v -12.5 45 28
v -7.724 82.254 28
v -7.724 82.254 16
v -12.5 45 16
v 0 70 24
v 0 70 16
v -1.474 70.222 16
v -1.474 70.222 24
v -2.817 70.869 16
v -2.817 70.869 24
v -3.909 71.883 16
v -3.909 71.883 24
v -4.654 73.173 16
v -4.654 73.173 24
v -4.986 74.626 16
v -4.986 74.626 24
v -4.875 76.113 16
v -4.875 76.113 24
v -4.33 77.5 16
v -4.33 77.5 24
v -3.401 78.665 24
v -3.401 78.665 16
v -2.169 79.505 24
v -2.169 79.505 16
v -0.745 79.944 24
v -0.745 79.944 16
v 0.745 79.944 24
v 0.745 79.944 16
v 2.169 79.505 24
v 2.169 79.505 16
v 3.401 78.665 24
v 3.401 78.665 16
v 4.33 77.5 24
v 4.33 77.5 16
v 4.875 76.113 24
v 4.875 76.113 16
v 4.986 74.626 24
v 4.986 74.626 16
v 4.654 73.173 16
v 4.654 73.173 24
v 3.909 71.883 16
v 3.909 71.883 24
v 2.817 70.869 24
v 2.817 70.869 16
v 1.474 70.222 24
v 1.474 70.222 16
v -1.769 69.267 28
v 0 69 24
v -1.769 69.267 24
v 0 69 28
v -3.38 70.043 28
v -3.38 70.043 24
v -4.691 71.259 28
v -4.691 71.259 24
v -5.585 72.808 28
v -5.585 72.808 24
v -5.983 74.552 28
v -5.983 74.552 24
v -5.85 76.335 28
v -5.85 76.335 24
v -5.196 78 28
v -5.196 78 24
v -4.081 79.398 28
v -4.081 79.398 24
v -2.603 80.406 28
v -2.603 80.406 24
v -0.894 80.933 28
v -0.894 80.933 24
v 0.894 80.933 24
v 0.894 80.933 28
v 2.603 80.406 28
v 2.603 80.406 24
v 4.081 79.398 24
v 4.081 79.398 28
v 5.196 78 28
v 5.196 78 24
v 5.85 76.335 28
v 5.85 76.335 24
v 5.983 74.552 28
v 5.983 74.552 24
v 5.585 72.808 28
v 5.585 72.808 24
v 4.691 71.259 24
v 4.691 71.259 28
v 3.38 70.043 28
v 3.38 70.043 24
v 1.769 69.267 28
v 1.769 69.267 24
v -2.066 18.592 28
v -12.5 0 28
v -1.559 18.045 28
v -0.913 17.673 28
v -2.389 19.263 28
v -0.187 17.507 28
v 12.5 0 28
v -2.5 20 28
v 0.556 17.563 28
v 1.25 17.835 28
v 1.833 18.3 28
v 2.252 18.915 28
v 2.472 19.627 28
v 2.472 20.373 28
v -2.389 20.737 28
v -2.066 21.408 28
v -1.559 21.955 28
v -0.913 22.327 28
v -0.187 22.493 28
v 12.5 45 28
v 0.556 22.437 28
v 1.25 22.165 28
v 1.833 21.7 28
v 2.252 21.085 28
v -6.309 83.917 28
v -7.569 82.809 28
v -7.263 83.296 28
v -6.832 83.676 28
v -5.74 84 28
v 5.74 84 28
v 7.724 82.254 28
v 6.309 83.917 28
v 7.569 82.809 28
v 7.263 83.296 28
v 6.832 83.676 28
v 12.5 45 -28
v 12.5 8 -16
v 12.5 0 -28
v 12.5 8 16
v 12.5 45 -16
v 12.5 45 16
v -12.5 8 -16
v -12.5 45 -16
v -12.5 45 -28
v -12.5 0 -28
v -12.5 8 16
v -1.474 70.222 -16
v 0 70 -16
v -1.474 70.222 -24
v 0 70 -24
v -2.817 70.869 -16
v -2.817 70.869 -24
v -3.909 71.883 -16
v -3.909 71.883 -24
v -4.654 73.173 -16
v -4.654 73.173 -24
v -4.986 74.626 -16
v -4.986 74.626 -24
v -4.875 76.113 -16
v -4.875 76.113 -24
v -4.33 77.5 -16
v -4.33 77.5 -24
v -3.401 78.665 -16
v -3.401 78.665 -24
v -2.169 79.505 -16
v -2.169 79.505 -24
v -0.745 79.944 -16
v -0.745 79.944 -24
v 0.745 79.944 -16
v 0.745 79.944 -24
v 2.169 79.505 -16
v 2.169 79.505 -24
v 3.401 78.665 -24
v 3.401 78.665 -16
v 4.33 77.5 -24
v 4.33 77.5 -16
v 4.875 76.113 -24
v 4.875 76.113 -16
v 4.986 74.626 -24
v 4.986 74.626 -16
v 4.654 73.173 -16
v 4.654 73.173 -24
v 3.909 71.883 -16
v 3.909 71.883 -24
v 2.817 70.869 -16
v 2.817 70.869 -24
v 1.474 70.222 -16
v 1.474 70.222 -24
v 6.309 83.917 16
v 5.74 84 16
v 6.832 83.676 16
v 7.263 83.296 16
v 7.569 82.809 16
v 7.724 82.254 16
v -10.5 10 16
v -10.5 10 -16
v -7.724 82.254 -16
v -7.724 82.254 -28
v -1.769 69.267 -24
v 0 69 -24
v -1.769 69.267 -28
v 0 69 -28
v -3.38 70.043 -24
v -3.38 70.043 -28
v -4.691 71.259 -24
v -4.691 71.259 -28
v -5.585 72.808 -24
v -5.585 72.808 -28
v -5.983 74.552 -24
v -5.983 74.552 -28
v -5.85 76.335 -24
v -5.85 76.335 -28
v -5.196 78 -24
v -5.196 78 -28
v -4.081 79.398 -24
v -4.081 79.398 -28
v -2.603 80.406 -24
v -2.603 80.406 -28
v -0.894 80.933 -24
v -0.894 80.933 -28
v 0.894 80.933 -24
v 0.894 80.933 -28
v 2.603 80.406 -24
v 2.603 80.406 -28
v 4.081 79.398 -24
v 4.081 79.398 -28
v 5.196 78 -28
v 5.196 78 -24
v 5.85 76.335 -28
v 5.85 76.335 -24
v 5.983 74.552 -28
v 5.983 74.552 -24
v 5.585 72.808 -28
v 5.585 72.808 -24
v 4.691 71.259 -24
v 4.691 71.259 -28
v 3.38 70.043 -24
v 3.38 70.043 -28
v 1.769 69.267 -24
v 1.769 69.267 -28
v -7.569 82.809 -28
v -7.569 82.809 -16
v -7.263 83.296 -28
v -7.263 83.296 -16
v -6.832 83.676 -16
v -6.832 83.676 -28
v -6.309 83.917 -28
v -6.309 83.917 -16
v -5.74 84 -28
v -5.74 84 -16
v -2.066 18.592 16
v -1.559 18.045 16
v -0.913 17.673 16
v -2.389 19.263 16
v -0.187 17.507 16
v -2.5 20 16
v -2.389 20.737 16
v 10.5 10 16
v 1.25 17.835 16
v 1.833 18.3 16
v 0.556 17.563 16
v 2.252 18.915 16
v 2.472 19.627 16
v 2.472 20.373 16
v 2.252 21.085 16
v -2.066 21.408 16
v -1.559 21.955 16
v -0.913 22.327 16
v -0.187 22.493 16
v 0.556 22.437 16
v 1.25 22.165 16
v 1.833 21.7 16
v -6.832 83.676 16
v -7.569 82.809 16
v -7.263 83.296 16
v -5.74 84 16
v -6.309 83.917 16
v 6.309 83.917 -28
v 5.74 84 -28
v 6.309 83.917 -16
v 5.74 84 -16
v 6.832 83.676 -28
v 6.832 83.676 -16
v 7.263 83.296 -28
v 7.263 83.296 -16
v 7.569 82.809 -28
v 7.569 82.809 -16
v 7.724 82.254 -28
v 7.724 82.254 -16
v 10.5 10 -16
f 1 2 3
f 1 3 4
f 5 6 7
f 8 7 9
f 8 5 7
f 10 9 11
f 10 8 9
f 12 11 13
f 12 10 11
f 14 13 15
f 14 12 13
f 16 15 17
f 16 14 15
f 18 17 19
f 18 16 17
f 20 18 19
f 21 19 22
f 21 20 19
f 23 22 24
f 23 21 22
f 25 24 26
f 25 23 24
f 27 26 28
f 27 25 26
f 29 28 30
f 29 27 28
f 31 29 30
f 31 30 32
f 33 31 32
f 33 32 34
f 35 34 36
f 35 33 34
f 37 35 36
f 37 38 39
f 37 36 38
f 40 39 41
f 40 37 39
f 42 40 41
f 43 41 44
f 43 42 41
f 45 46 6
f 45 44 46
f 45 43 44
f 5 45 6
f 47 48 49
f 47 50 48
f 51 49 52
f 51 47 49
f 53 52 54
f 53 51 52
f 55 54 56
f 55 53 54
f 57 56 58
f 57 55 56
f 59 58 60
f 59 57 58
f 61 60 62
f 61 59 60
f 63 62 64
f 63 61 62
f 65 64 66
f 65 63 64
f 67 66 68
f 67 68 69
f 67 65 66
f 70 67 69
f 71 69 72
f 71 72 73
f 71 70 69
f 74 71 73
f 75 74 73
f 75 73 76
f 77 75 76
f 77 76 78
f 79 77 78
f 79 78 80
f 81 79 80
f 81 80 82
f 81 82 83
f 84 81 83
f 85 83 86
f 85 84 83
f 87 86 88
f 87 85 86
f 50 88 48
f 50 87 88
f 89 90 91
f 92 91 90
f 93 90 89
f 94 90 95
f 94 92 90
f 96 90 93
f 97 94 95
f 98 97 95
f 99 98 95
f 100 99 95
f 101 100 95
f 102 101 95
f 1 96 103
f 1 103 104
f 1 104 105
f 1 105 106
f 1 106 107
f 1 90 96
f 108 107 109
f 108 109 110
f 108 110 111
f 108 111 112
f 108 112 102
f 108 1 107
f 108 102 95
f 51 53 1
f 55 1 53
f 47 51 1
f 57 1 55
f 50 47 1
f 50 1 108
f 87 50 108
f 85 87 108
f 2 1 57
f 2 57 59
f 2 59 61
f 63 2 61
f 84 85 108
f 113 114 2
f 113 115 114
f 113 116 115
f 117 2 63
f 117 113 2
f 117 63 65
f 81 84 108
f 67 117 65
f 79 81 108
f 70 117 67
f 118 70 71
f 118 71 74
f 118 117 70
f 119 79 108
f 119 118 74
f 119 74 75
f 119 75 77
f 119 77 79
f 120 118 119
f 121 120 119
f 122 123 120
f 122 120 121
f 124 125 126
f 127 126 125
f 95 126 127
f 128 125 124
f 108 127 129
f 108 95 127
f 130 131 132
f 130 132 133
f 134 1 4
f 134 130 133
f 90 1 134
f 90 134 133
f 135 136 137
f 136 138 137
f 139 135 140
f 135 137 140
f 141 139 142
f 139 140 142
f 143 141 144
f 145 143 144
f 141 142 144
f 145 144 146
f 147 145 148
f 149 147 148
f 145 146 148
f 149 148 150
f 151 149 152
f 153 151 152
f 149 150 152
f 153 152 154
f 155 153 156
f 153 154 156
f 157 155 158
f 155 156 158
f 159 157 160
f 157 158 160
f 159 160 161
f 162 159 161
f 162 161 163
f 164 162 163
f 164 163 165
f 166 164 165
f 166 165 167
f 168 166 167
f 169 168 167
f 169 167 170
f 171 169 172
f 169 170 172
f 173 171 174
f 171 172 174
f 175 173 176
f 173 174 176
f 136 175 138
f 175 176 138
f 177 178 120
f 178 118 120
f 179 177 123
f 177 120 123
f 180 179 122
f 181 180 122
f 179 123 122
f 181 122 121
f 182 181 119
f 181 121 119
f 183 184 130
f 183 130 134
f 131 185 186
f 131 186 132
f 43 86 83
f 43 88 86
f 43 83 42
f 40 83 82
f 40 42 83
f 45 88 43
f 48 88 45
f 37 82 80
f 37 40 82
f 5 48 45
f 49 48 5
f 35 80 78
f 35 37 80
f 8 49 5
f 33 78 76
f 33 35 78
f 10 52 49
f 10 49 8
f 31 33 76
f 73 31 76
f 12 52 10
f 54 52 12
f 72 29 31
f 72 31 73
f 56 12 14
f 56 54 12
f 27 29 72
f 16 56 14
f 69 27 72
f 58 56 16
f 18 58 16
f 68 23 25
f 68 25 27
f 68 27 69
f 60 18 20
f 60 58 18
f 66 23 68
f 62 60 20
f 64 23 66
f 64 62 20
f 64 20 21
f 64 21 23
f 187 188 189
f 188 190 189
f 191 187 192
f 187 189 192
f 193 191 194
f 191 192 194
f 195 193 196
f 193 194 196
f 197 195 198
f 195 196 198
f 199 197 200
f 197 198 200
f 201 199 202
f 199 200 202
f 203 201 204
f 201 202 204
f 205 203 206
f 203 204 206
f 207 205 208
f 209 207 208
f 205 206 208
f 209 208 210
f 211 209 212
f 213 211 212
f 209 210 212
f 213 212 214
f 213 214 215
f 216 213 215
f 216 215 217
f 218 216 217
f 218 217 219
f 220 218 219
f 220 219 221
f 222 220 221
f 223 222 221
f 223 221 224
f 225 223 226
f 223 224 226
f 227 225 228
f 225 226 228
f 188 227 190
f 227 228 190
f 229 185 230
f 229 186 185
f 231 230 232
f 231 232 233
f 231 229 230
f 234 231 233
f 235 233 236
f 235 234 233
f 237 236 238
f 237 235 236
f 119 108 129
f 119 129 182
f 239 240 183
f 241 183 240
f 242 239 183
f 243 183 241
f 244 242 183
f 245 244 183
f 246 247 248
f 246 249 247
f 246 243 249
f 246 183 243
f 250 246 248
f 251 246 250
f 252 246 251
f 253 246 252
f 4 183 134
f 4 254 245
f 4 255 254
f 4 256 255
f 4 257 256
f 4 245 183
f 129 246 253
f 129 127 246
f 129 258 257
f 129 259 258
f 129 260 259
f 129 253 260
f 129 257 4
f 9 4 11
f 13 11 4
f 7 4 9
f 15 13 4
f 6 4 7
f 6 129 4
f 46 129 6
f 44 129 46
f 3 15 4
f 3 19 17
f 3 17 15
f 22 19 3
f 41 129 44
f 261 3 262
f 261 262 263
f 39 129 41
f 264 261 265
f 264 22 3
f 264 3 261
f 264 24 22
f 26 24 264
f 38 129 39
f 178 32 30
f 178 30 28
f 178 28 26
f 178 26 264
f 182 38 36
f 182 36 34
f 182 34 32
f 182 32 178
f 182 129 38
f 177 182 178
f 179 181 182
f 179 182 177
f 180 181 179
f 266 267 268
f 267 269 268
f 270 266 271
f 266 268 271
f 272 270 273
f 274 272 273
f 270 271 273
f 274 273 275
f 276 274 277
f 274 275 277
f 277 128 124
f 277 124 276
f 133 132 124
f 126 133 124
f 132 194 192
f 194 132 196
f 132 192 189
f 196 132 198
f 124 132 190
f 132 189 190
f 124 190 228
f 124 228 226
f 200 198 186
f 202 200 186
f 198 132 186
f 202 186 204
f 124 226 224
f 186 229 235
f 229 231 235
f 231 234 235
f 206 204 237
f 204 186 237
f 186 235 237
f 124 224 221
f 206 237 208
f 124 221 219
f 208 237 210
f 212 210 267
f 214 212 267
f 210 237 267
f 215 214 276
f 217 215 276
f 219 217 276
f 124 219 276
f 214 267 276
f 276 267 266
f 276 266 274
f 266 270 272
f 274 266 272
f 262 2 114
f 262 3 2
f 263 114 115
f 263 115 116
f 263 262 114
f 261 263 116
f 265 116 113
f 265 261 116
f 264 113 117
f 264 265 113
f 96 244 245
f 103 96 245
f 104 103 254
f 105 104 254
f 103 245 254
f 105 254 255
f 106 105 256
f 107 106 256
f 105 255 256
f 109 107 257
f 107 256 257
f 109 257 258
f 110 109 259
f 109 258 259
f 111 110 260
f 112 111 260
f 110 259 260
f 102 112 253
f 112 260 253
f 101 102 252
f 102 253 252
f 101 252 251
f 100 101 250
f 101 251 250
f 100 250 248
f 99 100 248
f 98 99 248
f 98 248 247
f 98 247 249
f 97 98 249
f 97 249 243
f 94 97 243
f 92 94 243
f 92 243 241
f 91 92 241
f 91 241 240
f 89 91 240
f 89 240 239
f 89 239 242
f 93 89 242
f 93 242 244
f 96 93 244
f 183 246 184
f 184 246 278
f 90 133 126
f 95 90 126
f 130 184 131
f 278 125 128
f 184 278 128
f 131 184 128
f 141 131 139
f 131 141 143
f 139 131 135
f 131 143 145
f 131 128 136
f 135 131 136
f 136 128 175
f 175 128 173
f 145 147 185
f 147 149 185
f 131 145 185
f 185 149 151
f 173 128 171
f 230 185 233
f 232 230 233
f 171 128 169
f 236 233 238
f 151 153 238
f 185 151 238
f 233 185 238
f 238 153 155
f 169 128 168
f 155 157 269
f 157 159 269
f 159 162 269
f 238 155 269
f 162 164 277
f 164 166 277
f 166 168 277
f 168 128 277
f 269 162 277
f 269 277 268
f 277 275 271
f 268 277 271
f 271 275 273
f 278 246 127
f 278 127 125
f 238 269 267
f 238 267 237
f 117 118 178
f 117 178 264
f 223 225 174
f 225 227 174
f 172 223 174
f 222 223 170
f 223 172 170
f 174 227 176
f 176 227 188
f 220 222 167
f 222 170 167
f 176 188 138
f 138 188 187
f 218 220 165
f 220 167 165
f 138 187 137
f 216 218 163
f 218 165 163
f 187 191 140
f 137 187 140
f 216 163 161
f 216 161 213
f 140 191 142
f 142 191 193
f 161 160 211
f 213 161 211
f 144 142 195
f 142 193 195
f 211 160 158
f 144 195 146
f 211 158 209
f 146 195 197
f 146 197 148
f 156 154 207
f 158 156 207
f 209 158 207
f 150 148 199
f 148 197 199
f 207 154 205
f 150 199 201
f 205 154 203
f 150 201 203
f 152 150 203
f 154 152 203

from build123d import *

# Parameters (mm, degrees)
BOSS_EXTRUDE2_DEPTH   = 28
SKETCH16_W            = 32
SKETCH16_H            = 74
CUT_EXTRUDE3_DEPTH    = 26
M6_TAPPED_HOLE1_D     = 5
M6_TAPPED_HOLE1_DEPTH = 27
M6_TAPPED_HOLE1_TIP   = 1.502151548
CHAMFER1_SIZE         = 2
FILLET1_R             = 2


with BuildPart() as part:
    # Sketch15 → Boss-Extrude2 (new body, symmetric)
    with BuildSketch(Plane.XY):
        Polygon((-12.5, 0), (12.5, 0), (12.5, 45), (7.5, 84), (-7.5, 84), (-12.5, 45), align=None)
    extrude(amount=BOSS_EXTRUDE2_DEPTH, both=True)

    # Sketch16 → Cut-Extrude3 (cut, through all)
    with BuildSketch(Plane(origin=(12.5, 0, 0), x_dir=(0, 0, -1), z_dir=(1, 0, 0))):
        with Locations((0, 47)):
            Rectangle(SKETCH16_W, SKETCH16_H)
    extrude(amount=-CUT_EXTRUDE3_DEPTH, mode=Mode.SUBTRACT)

    # Sketch18 → CBORE for M4 Hex Socket Head Cap Screw1 (revolve, cut)
    with BuildSketch(Plane(origin=(0, 75, 28), x_dir=(0, -1, 0), z_dir=(1, 0, 0))):
        Polygon((0, 0), (0, 23.004303095), (5, 20), (5, 4), (6, 4), (6, 0), align=None)
    cbore_for_m4_hex_socket_head_cap_screw1 = revolve(axis=Axis((0, 75, 34.35), (0, 0, -1)), mode=Mode.SUBTRACT)

    # Mirror1: CBORE for M4 Hex Socket Head Cap Screw1 across plane
    add(cbore_for_m4_hex_socket_head_cap_screw1.mirror(Plane.XY), mode=Mode.SUBTRACT)

    # M6 Tapped Hole1
    with Locations(Plane.XY.offset(28)):
        with Locations((0, 20)):
            Hole(M6_TAPPED_HOLE1_D / 2, depth=M6_TAPPED_HOLE1_DEPTH)
            with Locations((0, 0, -(M6_TAPPED_HOLE1_DEPTH + M6_TAPPED_HOLE1_TIP / 2))):  # 118° drill point
                Cone(0, M6_TAPPED_HOLE1_D / 2, M6_TAPPED_HOLE1_TIP, mode=Mode.SUBTRACT)

    # Chamfer1
    chamfer1_edges = [part.edges().sort_by_distance(p)[0] for p in [
        (12.5, 10, 0),
        (-12.5, 10, 0),
    ]]
    chamfer(chamfer1_edges, length=CHAMFER1_SIZE)

    # Fillet1
    fillet1_edges = [part.edges().sort_by_distance(p)[0] for p in [
        (-7.5, 84, 22),
        (7.5, 84, 22),
        (-7.5, 84, -22),
        (7.5, 84, -22),
    ]]
    fillet(fillet1_edges, radius=FILLET1_R)


solid = part.part
